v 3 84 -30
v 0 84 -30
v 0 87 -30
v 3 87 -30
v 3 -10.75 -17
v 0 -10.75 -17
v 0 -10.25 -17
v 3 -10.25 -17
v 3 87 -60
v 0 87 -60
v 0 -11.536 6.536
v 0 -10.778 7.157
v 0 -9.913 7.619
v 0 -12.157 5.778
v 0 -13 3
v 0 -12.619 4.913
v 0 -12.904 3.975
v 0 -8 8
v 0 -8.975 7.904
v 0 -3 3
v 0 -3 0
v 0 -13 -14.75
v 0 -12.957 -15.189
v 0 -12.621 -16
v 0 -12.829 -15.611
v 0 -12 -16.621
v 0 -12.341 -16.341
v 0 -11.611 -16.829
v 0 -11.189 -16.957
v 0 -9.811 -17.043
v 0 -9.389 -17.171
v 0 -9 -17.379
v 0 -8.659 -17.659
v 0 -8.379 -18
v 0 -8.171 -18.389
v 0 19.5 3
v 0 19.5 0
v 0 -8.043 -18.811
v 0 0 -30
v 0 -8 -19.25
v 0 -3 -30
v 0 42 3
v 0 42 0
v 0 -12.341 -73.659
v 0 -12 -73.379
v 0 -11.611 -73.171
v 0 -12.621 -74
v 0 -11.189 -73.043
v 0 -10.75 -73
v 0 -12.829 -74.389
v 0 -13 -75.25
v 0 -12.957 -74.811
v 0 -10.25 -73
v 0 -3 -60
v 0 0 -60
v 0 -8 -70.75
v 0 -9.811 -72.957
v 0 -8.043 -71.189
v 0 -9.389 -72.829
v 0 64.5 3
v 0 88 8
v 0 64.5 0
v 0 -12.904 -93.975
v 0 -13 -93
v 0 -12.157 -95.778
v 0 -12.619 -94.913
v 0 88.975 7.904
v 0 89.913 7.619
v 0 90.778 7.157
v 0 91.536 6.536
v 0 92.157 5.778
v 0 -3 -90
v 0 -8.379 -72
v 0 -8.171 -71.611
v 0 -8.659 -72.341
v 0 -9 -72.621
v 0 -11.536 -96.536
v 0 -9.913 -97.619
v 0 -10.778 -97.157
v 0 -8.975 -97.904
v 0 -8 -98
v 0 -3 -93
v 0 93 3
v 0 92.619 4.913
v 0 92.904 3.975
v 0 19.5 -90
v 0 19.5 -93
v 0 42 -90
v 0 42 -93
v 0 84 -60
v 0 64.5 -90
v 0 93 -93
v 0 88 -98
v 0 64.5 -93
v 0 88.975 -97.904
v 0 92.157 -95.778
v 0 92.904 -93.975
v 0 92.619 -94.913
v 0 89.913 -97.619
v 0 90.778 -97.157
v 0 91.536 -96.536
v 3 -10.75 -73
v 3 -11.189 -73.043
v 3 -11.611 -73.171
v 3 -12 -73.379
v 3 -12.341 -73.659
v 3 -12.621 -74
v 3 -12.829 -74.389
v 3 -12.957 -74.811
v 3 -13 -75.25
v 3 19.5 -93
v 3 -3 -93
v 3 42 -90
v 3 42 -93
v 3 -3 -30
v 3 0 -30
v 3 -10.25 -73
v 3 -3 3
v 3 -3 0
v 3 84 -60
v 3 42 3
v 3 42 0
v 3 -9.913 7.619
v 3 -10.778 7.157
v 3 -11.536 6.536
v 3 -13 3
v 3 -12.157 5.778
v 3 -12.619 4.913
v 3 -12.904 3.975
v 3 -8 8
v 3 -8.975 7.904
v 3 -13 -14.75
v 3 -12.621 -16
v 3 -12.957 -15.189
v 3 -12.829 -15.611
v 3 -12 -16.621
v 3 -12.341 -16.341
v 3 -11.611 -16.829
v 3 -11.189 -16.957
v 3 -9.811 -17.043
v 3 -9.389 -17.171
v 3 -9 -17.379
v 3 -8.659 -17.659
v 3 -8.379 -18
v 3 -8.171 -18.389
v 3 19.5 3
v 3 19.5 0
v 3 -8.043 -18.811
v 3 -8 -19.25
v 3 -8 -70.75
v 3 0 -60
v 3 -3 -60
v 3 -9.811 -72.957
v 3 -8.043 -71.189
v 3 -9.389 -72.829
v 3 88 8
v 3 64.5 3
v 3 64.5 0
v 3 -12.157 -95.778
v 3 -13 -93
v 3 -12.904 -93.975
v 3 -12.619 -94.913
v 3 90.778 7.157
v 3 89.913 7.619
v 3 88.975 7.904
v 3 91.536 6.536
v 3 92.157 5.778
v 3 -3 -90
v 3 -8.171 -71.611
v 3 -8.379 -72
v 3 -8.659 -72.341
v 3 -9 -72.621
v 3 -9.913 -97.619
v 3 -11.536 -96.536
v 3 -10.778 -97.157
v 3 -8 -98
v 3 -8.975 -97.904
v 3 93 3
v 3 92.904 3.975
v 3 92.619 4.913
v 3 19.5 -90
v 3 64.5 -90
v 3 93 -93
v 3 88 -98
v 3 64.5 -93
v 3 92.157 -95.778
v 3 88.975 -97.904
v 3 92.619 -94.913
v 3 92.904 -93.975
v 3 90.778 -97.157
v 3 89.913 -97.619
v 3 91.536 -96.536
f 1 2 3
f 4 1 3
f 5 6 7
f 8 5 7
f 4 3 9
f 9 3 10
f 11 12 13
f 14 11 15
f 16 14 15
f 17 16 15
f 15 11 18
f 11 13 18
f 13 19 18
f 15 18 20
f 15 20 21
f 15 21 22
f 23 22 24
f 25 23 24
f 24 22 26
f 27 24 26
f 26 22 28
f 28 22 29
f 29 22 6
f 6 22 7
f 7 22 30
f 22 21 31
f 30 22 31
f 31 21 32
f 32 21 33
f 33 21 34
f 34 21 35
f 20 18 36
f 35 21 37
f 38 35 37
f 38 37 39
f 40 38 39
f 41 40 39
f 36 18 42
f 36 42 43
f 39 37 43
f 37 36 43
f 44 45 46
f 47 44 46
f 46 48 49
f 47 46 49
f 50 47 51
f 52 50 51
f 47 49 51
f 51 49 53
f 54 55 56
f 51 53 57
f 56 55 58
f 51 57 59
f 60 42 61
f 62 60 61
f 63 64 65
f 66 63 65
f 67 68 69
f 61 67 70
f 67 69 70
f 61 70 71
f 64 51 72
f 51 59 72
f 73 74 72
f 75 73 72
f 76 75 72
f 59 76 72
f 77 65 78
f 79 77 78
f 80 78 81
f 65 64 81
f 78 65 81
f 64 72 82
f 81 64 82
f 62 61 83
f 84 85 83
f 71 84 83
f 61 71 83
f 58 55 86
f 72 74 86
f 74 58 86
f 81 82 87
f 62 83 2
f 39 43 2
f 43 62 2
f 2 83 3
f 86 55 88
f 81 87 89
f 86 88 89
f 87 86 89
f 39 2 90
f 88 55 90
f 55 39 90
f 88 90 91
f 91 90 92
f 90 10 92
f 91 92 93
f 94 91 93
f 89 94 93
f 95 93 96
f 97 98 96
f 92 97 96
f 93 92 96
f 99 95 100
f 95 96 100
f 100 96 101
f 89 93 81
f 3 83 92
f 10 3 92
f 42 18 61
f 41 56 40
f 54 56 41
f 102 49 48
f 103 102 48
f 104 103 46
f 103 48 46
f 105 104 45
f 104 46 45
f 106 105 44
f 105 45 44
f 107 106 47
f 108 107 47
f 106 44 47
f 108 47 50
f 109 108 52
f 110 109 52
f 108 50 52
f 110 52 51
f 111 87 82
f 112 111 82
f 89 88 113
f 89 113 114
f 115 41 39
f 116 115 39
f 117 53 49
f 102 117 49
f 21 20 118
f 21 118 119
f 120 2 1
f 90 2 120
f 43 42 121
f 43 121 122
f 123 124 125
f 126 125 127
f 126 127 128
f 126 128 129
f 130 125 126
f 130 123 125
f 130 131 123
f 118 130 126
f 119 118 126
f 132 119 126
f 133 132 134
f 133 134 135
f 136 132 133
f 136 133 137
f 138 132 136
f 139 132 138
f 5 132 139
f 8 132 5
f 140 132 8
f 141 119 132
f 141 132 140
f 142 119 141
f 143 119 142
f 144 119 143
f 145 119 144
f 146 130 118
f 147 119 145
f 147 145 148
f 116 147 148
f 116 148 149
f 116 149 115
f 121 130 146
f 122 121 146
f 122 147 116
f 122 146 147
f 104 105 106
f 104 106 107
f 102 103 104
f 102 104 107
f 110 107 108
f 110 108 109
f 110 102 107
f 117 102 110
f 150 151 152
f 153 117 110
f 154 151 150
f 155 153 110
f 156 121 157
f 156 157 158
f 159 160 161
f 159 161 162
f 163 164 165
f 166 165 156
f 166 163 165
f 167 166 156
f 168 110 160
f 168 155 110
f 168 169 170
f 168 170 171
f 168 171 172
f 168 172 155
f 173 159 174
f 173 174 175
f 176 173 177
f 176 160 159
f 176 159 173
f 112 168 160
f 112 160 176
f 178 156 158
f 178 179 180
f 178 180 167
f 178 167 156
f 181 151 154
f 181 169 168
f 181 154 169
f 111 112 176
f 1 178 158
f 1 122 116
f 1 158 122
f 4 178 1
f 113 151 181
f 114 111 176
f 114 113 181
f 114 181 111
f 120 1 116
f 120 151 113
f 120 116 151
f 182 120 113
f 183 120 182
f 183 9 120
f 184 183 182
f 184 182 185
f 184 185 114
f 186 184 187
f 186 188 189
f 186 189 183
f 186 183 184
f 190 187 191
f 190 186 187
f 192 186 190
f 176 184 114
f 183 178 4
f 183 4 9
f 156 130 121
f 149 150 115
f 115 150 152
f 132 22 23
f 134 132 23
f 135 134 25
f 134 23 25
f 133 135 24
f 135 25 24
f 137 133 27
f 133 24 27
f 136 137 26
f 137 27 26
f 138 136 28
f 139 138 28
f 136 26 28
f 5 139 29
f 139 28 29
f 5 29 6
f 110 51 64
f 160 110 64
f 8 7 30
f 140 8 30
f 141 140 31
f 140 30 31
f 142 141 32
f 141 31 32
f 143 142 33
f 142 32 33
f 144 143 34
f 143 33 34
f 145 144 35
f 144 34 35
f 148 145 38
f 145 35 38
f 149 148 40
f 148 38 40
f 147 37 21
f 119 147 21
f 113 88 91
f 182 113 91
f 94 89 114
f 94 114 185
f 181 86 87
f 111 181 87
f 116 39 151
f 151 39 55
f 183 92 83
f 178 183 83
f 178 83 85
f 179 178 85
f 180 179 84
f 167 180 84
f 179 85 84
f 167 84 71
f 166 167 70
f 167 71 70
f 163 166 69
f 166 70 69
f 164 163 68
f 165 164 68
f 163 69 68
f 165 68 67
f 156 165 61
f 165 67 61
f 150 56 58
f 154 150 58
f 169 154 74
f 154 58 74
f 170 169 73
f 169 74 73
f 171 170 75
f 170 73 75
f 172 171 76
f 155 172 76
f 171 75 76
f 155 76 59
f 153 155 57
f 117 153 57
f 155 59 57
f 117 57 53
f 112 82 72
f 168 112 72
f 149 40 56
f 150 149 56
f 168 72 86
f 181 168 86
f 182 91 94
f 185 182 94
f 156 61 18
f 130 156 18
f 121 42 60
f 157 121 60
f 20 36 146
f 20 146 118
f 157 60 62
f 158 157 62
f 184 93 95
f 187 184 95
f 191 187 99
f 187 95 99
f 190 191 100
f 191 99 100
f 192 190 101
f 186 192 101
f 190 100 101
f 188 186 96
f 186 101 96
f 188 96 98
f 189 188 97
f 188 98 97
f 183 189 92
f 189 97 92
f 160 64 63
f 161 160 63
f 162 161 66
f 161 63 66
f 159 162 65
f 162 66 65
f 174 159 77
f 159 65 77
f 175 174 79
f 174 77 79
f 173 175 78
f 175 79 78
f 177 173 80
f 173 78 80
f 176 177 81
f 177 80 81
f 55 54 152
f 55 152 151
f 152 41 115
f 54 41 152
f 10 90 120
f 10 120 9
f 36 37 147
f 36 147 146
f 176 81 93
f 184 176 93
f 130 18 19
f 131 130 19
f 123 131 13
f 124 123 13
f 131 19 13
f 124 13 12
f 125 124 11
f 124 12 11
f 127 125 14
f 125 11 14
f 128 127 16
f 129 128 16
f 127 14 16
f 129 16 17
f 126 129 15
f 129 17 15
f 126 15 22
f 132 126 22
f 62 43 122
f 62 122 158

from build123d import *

# Parameters (mm, degrees)
SKETCH1_W           = 30
SKETCH1_H           = 3
SKETCH1_W_2         = 3
SKETCH1_H_2         = 22.5
BOSS_EXTRUDE1_DEPTH = 3


with BuildPart() as part:
    # Sketch1 → Boss-Extrude1 (new body)
    with BuildSketch(Plane(origin=(0, 0, 0), x_dir=(0, 0, -1), z_dir=(1, 0, 0))):
        with BuildLine():
            Line((75.25, -13), (93, -13))
            ThreePointArc((93, -13), (96.535533906, -11.535533906), (98, -8))
            Line((98, -8), (98, 88))
            ThreePointArc((98, 88), (96.535533906, 91.535533906), (93, 93))
            Line((93, 93), (-3, 93))
            ThreePointArc((-3, 93), (-6.535533906, 91.535533906), (-8, 88))
            Line((-8, 88), (-8, -8))
            ThreePointArc((-8, -8), (-6.535533906, -11.535533906), (-3, -13))
            Line((-3, -13), (14.75, -13))
            ThreePointArc((14.75, -13), (16.340990258, -12.340990258), (17, -10.75))
            Line((17, -10.75), (17, -10.25))
            ThreePointArc((17, -10.25), (17.659009742, -8.659009742), (19.25, -8))
            Line((19.25, -8), (70.75, -8))
            ThreePointArc((70.75, -8), (72.340990258, -8.659009742), (73, -10.25))
            Line((73, -10.25), (73, -10.75))
            ThreePointArc((73, -10.75), (73.659009742, -12.340990258), (75.25, -13))
        make_face()
        Polygon((0, 0), (0, 19.5), (-3, 19.5), (-3, -3), (0, -3), align=None, mode=Mode.SUBTRACT)
        Polygon((90, 0), (90, 19.5), (93, 19.5), (93, -3), (90, -3), align=None, mode=Mode.SUBTRACT)
        with Locations((45, 85.5)):
            Rectangle(SKETCH1_W, SKETCH1_H, mode=Mode.SUBTRACT)
        with Locations((45, -1.5)):
            Rectangle(SKETCH1_W, SKETCH1_H, mode=Mode.SUBTRACT)
        with Locations((91.5, 53.25)):
            Rectangle(SKETCH1_W_2, SKETCH1_H_2, mode=Mode.SUBTRACT)
        with Locations((-1.5, 53.25)):
            Rectangle(SKETCH1_W_2, SKETCH1_H_2, mode=Mode.SUBTRACT)
    extrude(amount=BOSS_EXTRUDE1_DEPTH)


solid = part.part
